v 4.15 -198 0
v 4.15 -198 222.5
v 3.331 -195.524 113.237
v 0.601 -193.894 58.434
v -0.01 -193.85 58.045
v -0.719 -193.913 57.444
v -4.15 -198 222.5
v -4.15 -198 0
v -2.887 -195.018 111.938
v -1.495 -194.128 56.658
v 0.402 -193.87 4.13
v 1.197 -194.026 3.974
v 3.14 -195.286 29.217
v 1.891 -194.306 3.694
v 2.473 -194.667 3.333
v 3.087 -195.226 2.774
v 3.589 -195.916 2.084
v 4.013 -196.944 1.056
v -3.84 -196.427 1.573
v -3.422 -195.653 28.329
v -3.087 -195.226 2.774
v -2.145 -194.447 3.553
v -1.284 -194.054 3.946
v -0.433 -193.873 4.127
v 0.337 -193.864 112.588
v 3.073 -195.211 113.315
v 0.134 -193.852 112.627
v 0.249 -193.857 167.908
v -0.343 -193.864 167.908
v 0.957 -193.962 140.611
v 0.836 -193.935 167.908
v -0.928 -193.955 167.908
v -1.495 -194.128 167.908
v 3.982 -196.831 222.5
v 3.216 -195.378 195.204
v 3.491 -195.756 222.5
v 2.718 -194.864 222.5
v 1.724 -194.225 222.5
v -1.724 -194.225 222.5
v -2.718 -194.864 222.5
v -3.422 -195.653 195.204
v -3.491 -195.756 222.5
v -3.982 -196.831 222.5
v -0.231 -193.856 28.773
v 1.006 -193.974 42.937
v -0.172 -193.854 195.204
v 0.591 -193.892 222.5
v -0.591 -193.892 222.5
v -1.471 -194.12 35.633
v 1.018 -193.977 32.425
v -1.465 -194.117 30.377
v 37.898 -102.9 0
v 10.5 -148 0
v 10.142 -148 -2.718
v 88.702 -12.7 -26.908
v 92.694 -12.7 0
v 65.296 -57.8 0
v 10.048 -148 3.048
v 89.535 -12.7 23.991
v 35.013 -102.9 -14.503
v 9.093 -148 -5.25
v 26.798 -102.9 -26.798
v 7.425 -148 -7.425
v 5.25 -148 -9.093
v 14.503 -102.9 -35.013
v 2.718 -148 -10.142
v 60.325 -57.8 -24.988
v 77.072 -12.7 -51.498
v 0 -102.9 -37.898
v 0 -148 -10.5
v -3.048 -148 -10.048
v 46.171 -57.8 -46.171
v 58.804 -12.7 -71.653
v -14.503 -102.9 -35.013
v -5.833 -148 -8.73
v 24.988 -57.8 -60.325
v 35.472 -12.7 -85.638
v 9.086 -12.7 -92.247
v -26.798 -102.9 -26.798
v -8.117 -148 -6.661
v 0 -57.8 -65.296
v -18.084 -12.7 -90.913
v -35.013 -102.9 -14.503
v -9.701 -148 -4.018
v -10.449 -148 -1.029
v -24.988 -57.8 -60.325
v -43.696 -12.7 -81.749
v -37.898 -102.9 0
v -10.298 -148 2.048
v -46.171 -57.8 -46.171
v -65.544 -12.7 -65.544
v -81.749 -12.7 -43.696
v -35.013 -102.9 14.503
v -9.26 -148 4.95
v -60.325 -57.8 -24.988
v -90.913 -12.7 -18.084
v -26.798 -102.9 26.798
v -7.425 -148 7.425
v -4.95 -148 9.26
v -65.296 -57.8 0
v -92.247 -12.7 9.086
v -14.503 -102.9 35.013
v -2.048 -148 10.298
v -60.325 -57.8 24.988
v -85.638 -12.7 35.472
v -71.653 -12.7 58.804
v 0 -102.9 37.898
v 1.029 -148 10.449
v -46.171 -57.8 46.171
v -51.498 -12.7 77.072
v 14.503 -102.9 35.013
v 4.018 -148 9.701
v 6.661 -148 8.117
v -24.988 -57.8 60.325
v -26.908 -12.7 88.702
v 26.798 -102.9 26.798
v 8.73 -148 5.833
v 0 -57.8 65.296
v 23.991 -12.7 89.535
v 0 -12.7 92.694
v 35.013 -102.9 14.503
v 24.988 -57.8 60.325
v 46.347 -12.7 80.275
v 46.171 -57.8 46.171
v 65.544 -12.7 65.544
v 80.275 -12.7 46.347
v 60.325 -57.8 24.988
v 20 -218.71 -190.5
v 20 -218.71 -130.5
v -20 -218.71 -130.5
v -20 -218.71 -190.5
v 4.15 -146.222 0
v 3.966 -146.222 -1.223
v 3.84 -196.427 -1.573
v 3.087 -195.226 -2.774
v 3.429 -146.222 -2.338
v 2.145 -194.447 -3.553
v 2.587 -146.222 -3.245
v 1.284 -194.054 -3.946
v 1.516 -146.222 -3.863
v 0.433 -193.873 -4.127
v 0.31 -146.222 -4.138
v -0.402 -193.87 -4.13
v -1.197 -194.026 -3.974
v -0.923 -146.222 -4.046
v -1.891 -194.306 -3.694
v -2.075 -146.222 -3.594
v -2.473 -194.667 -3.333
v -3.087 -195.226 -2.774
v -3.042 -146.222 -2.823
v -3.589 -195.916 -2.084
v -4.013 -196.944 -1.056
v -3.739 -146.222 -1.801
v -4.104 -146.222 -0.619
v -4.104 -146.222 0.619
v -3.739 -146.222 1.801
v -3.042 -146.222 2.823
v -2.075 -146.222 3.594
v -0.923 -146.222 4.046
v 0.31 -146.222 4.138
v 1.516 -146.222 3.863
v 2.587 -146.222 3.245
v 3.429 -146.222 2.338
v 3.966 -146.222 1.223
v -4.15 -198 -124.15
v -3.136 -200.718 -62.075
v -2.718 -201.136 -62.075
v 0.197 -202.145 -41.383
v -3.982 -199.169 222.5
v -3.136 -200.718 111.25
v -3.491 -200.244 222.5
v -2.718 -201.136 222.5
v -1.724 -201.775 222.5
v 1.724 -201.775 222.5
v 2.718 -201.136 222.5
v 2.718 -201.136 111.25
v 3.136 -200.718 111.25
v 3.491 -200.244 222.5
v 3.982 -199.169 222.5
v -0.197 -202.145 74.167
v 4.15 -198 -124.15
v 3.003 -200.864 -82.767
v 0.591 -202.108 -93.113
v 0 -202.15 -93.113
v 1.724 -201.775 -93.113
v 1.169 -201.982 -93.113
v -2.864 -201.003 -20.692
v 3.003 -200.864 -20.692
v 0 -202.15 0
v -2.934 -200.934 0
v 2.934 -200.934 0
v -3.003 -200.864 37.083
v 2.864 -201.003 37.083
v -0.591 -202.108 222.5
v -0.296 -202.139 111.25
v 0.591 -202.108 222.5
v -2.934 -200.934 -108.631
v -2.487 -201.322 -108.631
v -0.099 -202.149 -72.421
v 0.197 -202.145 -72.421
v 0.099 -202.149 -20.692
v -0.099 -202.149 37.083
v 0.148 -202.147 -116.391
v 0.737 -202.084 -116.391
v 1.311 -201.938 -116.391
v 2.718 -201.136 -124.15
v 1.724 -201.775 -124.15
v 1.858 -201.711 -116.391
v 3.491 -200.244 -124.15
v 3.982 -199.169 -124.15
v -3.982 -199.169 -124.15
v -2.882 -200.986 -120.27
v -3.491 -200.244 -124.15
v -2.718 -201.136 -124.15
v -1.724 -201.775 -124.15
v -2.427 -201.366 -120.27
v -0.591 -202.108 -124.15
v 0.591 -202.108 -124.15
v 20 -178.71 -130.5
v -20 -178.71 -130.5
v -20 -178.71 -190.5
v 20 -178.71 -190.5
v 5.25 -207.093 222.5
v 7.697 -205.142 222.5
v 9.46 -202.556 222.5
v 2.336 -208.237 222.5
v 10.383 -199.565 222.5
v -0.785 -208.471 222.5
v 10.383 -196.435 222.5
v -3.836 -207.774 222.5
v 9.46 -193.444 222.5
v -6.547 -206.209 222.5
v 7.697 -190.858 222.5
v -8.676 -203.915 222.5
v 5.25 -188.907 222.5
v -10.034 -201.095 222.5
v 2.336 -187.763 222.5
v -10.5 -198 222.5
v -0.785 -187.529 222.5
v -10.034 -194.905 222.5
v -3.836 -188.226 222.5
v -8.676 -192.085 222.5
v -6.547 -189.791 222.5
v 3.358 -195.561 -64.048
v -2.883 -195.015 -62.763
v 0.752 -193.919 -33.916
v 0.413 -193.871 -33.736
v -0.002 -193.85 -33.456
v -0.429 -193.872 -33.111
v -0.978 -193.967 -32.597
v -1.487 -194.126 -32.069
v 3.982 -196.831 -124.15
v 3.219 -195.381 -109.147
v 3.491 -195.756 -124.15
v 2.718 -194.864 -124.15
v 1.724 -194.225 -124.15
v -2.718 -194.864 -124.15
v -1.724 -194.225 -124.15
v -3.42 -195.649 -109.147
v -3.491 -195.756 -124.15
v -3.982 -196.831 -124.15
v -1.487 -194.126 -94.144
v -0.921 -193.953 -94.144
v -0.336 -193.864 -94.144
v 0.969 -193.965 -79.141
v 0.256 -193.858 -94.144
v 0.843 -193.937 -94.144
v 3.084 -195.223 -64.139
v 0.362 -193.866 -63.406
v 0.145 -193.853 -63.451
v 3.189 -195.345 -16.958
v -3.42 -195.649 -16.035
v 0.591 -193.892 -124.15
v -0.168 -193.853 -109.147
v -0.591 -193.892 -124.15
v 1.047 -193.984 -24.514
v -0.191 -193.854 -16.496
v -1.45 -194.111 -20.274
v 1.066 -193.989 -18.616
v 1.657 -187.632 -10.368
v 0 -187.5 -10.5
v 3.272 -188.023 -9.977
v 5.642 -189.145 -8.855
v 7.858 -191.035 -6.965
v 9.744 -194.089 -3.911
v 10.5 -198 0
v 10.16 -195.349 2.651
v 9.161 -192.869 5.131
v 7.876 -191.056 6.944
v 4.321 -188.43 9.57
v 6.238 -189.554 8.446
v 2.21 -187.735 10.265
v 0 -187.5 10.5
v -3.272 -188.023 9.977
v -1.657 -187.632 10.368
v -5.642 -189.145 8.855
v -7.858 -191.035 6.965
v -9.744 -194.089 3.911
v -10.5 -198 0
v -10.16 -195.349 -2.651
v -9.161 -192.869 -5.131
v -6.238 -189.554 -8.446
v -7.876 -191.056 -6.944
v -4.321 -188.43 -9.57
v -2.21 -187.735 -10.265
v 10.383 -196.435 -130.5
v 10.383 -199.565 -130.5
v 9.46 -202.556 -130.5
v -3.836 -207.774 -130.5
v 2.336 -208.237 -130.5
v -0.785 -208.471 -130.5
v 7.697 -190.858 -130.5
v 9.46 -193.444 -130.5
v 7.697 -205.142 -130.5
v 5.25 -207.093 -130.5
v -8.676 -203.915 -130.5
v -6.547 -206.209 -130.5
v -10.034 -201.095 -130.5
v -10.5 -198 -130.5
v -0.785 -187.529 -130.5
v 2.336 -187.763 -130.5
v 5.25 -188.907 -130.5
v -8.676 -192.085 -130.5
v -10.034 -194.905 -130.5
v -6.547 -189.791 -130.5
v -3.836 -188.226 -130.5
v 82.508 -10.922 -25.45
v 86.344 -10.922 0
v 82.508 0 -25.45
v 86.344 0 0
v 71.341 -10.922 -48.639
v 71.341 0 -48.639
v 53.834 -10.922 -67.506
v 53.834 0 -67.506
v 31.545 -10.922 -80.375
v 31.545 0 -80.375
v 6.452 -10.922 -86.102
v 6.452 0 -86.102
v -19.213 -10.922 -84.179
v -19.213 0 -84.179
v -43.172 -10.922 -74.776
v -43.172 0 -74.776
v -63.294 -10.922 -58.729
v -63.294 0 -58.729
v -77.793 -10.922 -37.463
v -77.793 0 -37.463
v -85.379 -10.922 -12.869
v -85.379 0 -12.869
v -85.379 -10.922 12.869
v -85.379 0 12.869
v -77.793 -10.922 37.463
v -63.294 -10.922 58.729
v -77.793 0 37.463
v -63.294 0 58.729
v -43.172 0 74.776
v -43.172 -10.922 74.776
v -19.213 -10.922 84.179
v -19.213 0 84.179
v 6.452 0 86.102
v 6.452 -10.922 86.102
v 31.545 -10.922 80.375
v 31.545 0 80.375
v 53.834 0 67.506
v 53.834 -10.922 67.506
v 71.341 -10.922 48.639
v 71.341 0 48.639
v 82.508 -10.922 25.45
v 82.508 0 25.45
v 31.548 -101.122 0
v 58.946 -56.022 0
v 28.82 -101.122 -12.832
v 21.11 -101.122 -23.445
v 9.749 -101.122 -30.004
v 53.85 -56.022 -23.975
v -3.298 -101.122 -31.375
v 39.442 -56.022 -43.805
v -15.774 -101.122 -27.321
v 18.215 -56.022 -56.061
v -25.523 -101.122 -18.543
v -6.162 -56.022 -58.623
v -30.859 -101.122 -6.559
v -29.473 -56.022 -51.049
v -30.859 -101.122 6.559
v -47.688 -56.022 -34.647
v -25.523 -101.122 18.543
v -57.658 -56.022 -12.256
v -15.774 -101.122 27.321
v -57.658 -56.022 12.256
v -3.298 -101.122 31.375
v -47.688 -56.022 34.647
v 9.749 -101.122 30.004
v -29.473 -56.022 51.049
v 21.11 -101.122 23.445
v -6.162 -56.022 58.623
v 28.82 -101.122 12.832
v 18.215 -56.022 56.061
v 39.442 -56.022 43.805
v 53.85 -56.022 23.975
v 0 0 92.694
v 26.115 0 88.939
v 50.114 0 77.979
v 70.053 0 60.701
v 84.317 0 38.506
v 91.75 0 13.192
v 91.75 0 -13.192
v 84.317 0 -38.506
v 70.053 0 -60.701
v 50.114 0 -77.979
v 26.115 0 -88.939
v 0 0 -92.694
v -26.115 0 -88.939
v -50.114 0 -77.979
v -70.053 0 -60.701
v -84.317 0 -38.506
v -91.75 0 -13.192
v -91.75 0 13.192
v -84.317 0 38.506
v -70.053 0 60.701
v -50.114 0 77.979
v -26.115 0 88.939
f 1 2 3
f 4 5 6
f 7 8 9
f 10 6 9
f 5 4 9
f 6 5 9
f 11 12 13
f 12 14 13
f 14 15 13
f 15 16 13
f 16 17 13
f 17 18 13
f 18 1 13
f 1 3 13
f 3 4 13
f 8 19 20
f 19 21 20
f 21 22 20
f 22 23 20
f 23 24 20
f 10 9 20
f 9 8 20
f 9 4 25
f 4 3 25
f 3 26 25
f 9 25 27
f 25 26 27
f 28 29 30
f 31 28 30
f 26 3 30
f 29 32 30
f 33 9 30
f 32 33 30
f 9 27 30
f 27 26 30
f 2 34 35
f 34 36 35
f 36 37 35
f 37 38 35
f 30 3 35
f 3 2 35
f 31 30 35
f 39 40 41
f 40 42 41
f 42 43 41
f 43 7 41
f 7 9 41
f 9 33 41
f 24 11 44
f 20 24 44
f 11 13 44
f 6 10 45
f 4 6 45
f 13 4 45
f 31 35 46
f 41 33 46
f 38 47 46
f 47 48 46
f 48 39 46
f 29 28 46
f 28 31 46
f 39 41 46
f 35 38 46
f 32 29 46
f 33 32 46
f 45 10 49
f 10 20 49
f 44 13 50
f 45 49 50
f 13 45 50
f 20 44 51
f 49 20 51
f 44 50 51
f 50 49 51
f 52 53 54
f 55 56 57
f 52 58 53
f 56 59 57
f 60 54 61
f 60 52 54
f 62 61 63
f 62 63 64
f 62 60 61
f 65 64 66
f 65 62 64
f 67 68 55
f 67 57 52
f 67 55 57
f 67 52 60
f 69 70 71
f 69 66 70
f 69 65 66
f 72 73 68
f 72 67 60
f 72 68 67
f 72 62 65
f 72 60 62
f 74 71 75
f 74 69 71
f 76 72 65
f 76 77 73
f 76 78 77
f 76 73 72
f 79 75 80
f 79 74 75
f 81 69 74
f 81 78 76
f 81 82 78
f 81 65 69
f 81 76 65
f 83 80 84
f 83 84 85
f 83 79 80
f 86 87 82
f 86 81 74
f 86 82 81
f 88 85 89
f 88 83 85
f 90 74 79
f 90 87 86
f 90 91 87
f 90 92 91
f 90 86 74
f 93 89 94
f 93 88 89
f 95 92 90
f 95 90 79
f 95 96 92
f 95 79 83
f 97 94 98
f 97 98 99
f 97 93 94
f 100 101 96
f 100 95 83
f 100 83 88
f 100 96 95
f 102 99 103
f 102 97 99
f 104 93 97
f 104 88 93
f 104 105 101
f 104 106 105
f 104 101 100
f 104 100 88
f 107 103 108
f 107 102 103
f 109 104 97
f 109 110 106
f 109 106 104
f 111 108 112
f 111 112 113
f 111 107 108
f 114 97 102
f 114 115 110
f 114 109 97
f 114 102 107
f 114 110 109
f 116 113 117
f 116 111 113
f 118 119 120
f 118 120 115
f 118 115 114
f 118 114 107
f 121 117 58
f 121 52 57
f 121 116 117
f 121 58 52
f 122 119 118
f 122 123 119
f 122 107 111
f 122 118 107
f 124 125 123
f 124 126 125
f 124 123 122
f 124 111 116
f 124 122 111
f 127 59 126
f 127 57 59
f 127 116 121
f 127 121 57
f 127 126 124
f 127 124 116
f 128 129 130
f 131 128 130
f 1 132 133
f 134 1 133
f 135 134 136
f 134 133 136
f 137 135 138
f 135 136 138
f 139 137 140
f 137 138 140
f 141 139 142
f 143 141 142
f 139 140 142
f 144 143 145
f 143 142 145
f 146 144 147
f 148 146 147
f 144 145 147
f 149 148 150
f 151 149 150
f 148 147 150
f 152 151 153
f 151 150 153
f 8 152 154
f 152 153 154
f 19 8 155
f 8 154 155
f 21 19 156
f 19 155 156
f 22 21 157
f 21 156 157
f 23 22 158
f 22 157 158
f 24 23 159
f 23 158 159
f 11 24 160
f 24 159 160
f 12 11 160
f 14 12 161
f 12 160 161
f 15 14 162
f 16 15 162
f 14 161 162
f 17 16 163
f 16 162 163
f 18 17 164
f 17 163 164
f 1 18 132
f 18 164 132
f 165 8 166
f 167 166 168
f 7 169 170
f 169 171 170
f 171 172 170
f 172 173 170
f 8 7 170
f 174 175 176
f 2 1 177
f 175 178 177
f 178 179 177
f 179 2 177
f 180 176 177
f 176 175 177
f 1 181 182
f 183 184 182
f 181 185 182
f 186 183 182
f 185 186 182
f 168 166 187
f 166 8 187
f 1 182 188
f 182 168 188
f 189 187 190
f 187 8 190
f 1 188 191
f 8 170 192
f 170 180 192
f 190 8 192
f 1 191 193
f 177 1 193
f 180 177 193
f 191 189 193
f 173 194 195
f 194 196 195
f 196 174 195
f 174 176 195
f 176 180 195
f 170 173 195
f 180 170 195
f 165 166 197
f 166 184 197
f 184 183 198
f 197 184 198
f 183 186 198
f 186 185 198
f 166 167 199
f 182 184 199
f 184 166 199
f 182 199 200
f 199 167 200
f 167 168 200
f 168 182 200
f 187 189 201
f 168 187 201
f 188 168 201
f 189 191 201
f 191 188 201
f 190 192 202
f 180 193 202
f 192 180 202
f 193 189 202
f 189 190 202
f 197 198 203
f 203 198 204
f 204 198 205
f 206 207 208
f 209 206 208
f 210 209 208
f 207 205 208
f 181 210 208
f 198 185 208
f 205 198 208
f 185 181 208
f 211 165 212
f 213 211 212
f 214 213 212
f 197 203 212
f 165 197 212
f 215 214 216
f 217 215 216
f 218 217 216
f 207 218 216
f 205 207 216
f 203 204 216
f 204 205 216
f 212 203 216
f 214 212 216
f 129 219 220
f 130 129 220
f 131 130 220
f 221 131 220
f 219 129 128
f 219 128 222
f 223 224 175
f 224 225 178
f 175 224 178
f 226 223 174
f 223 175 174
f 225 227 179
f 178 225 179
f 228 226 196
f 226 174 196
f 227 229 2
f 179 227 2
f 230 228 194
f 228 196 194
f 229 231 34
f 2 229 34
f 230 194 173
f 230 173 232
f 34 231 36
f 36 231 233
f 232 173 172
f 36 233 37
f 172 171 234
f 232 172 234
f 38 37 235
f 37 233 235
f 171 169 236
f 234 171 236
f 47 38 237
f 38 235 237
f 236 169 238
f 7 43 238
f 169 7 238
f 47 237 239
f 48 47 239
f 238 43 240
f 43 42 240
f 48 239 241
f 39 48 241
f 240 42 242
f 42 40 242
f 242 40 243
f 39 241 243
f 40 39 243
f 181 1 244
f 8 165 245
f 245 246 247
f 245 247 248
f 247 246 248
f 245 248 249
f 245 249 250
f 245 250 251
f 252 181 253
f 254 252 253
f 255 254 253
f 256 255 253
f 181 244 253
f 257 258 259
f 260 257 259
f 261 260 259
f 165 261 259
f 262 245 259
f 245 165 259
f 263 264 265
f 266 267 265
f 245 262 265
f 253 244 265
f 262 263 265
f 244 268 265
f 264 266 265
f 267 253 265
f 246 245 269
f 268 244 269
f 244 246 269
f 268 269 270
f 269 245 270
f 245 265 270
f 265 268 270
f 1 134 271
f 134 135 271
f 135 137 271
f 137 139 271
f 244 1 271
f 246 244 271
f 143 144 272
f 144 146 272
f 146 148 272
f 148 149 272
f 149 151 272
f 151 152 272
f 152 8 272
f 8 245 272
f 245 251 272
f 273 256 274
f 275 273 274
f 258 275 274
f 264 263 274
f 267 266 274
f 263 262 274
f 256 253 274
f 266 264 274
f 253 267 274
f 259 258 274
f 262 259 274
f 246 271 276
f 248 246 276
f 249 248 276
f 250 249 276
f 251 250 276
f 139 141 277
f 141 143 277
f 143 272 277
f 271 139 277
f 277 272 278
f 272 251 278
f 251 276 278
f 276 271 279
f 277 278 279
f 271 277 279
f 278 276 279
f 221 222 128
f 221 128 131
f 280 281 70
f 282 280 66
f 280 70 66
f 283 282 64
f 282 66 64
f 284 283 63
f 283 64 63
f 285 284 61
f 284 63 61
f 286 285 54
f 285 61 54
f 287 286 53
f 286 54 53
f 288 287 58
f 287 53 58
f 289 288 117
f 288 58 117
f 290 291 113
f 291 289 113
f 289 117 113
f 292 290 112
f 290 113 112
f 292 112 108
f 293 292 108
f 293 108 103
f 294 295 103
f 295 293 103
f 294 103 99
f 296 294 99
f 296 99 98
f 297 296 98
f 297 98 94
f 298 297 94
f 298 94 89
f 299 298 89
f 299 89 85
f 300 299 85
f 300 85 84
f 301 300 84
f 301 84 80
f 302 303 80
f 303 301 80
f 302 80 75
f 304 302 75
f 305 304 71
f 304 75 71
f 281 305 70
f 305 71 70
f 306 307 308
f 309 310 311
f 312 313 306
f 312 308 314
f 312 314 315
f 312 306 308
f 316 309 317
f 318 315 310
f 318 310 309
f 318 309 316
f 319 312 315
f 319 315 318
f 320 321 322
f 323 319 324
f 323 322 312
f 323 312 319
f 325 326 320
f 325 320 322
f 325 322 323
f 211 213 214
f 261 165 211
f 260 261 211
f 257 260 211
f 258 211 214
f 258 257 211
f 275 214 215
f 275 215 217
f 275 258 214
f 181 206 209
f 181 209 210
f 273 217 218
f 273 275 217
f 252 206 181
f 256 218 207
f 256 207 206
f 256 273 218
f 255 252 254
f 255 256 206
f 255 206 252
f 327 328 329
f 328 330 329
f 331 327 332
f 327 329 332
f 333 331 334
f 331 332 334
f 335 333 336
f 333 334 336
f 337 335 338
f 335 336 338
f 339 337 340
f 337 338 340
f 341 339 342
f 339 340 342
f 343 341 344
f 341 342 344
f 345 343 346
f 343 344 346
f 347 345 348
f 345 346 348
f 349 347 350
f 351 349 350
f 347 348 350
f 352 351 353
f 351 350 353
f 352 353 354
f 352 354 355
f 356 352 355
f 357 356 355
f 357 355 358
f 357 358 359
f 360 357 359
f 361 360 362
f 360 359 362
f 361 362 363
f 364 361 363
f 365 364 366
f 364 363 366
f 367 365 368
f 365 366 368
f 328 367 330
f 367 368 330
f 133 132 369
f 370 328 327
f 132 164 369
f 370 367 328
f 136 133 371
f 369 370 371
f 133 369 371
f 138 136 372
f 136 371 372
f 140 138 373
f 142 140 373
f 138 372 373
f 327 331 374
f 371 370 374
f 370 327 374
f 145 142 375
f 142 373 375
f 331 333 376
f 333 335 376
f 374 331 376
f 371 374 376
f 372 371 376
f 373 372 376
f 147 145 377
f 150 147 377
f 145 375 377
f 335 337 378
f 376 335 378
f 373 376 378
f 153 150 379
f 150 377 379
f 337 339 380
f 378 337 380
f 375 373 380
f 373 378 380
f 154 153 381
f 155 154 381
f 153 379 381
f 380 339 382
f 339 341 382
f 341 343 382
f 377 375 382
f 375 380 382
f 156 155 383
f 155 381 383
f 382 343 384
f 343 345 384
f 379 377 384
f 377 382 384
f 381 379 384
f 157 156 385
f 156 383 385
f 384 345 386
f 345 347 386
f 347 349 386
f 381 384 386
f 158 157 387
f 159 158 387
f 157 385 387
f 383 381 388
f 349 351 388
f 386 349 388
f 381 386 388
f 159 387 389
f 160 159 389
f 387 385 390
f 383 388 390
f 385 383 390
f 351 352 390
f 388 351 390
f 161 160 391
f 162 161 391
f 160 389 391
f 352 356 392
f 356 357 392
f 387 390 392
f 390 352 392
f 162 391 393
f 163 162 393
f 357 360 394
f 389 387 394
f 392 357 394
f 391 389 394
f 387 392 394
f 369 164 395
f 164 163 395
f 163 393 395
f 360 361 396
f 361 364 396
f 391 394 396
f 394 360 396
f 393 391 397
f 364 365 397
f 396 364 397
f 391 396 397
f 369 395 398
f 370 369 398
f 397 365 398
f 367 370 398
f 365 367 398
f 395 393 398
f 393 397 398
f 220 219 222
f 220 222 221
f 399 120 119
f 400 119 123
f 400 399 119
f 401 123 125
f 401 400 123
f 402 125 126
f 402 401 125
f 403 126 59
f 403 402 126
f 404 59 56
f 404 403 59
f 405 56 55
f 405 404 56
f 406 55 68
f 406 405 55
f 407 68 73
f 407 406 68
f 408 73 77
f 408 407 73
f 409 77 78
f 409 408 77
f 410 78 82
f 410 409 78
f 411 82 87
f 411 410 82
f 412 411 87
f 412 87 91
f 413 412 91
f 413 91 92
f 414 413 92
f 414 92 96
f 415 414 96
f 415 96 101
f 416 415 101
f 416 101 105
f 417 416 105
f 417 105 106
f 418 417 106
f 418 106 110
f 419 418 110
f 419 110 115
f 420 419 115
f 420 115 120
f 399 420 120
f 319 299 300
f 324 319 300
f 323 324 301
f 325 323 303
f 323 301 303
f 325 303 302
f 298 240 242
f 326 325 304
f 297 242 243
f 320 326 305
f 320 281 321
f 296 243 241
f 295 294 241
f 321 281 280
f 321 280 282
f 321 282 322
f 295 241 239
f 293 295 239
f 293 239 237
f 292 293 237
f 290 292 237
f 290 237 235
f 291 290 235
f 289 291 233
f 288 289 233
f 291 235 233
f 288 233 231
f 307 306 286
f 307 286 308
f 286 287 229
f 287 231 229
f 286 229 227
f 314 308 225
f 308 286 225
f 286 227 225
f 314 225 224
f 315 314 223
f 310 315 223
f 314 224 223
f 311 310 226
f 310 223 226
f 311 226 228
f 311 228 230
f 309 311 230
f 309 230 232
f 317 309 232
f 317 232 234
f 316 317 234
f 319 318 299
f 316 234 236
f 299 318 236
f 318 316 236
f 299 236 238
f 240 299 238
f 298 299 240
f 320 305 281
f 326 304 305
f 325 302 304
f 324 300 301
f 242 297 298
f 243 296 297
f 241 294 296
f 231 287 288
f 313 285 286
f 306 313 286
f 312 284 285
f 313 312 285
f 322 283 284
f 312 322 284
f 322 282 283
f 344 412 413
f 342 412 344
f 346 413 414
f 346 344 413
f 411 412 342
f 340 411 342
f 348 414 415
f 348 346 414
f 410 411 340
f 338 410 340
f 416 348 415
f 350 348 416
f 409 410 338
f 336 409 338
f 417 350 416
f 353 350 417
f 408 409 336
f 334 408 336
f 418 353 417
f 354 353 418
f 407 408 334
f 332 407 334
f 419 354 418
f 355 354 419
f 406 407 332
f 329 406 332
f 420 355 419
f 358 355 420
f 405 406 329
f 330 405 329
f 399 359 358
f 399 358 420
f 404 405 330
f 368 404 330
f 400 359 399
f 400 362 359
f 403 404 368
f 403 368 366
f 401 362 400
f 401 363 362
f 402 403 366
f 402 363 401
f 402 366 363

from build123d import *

# Parameters (mm, degrees)
CROQUIS1_R                   = 92.69375
SALIENTE_EXTRUIR1_DEPTH      = 12.7
CROQUIS3_R                   = 10.5
CROQUIS2_R                   = 92.69375
CROQUIS4_R                   = 10.5
SALIENTE_EXTRUIR2_DEPTH      = 50
SALIENTE_EXTRUIR3_DEPTH      = 120
SALIENTE_EXTRUIR3_DEPTH_BACK = 233
CROQUIS5_R                   = 10.5
CROQUIS6_W                   = 40
CROQUIS6_H                   = 40
SALIENTE_EXTRUIR4_DEPTH      = 60


with BuildPart() as part:
    # Croquis1 → Saliente-Extruir1 (new body)
    with BuildSketch(Plane(origin=(0, 0, 0), x_dir=(1, 0, 0), z_dir=(0, 1, 0))):
        with Locations(Location((0, 0, 0), (0, 0, 270))):
            Circle(CROQUIS1_R)
    extrude(amount=-SALIENTE_EXTRUIR1_DEPTH)

    # Croquis3 → Recubrir1 section 0
    with BuildSketch(Plane(origin=(0, -148, 0), x_dir=(1, 0, 0), z_dir=(0, 1, 0))):
        Circle(CROQUIS3_R)
    # Croquis2 → Recubrir1 section 1
    with BuildSketch(Plane.XZ.offset(12.7)):
        Circle(CROQUIS2_R)
    loft()

    # Croquis4 → Saliente-Extruir2 (add)
    with BuildSketch(Plane.XZ.offset(148)):
        with Locations(Location((0, 0, 0), (0, 0, 270))):
            Circle(CROQUIS4_R)
    extrude(amount=SALIENTE_EXTRUIR2_DEPTH)

    # Croquis5 → Saliente-Extruir3 (add, two sides: drawn at the far end of the back side and taken through both)
    with BuildSketch(Plane(origin=(0, 0, -10.5), x_dir=(-1, 0, 0), z_dir=(0, 0, -1)).offset(-SALIENTE_EXTRUIR3_DEPTH_BACK)):
        with Locations((0, -198)):
            Circle(CROQUIS5_R)
    extrude(amount=SALIENTE_EXTRUIR3_DEPTH + SALIENTE_EXTRUIR3_DEPTH_BACK)

    # Vaciado1: read off the stored shape, not the designer's step
    # Vaciado1 outline → Vaciado1 (revolve, cut)
    with BuildSketch(Plane.XY):
        Polygon((0, -198), (4.15, -198), (4.15, -146.22236581), (86.34375, -10.92236581), (86.34375, 0), (0, 0), align=None)
    revolve(axis=Axis((0, 0, 0), (0, 1, 0)), mode=Mode.SUBTRACT)

    # Vaciado1 2: loft between two sections, ruled curve by curve
    vaciado1_2_from = [
        Edge.make_three_point_arc((-4.15, -198, -124.15), (0, -202.15, -124.15), (4.15, -198, -124.15)),
        Edge.make_three_point_arc((4.15, -198, -124.15), (0, -193.85, -124.15), (-4.15, -198, -124.15)),
    ]
    vaciado1_2_to = [
        Edge.make_three_point_arc((-4.15, -198, 222.5), (0, -202.15, 222.5), (4.15, -198, 222.5)),
        Edge.make_three_point_arc((4.15, -198, 222.5), (0, -193.85, 222.5), (-4.15, -198, 222.5)),
    ]
    vaciado1_2 = Solid(Shell([*[Face.make_surface_from_curves(vaciado1_2_from[k], vaciado1_2_to[k]) for k in range(2)], Face(Wire(vaciado1_2_from)), Face(Wire(vaciado1_2_to))]))
    add(vaciado1_2, mode=Mode.SUBTRACT)


with BuildPart() as body_2:
    # Croquis6 → Saliente-Extruir4 (new body)
    with BuildSketch(Plane(origin=(0, 0, -130.5), x_dir=(-1, 0, 0), z_dir=(0, 0, -1))):
        with Locations((0, -198.710342853)):
            Rectangle(CROQUIS6_W, CROQUIS6_H)
    extrude(amount=SALIENTE_EXTRUIR4_DEPTH)


solid = Compound([part.part, body_2.part])
